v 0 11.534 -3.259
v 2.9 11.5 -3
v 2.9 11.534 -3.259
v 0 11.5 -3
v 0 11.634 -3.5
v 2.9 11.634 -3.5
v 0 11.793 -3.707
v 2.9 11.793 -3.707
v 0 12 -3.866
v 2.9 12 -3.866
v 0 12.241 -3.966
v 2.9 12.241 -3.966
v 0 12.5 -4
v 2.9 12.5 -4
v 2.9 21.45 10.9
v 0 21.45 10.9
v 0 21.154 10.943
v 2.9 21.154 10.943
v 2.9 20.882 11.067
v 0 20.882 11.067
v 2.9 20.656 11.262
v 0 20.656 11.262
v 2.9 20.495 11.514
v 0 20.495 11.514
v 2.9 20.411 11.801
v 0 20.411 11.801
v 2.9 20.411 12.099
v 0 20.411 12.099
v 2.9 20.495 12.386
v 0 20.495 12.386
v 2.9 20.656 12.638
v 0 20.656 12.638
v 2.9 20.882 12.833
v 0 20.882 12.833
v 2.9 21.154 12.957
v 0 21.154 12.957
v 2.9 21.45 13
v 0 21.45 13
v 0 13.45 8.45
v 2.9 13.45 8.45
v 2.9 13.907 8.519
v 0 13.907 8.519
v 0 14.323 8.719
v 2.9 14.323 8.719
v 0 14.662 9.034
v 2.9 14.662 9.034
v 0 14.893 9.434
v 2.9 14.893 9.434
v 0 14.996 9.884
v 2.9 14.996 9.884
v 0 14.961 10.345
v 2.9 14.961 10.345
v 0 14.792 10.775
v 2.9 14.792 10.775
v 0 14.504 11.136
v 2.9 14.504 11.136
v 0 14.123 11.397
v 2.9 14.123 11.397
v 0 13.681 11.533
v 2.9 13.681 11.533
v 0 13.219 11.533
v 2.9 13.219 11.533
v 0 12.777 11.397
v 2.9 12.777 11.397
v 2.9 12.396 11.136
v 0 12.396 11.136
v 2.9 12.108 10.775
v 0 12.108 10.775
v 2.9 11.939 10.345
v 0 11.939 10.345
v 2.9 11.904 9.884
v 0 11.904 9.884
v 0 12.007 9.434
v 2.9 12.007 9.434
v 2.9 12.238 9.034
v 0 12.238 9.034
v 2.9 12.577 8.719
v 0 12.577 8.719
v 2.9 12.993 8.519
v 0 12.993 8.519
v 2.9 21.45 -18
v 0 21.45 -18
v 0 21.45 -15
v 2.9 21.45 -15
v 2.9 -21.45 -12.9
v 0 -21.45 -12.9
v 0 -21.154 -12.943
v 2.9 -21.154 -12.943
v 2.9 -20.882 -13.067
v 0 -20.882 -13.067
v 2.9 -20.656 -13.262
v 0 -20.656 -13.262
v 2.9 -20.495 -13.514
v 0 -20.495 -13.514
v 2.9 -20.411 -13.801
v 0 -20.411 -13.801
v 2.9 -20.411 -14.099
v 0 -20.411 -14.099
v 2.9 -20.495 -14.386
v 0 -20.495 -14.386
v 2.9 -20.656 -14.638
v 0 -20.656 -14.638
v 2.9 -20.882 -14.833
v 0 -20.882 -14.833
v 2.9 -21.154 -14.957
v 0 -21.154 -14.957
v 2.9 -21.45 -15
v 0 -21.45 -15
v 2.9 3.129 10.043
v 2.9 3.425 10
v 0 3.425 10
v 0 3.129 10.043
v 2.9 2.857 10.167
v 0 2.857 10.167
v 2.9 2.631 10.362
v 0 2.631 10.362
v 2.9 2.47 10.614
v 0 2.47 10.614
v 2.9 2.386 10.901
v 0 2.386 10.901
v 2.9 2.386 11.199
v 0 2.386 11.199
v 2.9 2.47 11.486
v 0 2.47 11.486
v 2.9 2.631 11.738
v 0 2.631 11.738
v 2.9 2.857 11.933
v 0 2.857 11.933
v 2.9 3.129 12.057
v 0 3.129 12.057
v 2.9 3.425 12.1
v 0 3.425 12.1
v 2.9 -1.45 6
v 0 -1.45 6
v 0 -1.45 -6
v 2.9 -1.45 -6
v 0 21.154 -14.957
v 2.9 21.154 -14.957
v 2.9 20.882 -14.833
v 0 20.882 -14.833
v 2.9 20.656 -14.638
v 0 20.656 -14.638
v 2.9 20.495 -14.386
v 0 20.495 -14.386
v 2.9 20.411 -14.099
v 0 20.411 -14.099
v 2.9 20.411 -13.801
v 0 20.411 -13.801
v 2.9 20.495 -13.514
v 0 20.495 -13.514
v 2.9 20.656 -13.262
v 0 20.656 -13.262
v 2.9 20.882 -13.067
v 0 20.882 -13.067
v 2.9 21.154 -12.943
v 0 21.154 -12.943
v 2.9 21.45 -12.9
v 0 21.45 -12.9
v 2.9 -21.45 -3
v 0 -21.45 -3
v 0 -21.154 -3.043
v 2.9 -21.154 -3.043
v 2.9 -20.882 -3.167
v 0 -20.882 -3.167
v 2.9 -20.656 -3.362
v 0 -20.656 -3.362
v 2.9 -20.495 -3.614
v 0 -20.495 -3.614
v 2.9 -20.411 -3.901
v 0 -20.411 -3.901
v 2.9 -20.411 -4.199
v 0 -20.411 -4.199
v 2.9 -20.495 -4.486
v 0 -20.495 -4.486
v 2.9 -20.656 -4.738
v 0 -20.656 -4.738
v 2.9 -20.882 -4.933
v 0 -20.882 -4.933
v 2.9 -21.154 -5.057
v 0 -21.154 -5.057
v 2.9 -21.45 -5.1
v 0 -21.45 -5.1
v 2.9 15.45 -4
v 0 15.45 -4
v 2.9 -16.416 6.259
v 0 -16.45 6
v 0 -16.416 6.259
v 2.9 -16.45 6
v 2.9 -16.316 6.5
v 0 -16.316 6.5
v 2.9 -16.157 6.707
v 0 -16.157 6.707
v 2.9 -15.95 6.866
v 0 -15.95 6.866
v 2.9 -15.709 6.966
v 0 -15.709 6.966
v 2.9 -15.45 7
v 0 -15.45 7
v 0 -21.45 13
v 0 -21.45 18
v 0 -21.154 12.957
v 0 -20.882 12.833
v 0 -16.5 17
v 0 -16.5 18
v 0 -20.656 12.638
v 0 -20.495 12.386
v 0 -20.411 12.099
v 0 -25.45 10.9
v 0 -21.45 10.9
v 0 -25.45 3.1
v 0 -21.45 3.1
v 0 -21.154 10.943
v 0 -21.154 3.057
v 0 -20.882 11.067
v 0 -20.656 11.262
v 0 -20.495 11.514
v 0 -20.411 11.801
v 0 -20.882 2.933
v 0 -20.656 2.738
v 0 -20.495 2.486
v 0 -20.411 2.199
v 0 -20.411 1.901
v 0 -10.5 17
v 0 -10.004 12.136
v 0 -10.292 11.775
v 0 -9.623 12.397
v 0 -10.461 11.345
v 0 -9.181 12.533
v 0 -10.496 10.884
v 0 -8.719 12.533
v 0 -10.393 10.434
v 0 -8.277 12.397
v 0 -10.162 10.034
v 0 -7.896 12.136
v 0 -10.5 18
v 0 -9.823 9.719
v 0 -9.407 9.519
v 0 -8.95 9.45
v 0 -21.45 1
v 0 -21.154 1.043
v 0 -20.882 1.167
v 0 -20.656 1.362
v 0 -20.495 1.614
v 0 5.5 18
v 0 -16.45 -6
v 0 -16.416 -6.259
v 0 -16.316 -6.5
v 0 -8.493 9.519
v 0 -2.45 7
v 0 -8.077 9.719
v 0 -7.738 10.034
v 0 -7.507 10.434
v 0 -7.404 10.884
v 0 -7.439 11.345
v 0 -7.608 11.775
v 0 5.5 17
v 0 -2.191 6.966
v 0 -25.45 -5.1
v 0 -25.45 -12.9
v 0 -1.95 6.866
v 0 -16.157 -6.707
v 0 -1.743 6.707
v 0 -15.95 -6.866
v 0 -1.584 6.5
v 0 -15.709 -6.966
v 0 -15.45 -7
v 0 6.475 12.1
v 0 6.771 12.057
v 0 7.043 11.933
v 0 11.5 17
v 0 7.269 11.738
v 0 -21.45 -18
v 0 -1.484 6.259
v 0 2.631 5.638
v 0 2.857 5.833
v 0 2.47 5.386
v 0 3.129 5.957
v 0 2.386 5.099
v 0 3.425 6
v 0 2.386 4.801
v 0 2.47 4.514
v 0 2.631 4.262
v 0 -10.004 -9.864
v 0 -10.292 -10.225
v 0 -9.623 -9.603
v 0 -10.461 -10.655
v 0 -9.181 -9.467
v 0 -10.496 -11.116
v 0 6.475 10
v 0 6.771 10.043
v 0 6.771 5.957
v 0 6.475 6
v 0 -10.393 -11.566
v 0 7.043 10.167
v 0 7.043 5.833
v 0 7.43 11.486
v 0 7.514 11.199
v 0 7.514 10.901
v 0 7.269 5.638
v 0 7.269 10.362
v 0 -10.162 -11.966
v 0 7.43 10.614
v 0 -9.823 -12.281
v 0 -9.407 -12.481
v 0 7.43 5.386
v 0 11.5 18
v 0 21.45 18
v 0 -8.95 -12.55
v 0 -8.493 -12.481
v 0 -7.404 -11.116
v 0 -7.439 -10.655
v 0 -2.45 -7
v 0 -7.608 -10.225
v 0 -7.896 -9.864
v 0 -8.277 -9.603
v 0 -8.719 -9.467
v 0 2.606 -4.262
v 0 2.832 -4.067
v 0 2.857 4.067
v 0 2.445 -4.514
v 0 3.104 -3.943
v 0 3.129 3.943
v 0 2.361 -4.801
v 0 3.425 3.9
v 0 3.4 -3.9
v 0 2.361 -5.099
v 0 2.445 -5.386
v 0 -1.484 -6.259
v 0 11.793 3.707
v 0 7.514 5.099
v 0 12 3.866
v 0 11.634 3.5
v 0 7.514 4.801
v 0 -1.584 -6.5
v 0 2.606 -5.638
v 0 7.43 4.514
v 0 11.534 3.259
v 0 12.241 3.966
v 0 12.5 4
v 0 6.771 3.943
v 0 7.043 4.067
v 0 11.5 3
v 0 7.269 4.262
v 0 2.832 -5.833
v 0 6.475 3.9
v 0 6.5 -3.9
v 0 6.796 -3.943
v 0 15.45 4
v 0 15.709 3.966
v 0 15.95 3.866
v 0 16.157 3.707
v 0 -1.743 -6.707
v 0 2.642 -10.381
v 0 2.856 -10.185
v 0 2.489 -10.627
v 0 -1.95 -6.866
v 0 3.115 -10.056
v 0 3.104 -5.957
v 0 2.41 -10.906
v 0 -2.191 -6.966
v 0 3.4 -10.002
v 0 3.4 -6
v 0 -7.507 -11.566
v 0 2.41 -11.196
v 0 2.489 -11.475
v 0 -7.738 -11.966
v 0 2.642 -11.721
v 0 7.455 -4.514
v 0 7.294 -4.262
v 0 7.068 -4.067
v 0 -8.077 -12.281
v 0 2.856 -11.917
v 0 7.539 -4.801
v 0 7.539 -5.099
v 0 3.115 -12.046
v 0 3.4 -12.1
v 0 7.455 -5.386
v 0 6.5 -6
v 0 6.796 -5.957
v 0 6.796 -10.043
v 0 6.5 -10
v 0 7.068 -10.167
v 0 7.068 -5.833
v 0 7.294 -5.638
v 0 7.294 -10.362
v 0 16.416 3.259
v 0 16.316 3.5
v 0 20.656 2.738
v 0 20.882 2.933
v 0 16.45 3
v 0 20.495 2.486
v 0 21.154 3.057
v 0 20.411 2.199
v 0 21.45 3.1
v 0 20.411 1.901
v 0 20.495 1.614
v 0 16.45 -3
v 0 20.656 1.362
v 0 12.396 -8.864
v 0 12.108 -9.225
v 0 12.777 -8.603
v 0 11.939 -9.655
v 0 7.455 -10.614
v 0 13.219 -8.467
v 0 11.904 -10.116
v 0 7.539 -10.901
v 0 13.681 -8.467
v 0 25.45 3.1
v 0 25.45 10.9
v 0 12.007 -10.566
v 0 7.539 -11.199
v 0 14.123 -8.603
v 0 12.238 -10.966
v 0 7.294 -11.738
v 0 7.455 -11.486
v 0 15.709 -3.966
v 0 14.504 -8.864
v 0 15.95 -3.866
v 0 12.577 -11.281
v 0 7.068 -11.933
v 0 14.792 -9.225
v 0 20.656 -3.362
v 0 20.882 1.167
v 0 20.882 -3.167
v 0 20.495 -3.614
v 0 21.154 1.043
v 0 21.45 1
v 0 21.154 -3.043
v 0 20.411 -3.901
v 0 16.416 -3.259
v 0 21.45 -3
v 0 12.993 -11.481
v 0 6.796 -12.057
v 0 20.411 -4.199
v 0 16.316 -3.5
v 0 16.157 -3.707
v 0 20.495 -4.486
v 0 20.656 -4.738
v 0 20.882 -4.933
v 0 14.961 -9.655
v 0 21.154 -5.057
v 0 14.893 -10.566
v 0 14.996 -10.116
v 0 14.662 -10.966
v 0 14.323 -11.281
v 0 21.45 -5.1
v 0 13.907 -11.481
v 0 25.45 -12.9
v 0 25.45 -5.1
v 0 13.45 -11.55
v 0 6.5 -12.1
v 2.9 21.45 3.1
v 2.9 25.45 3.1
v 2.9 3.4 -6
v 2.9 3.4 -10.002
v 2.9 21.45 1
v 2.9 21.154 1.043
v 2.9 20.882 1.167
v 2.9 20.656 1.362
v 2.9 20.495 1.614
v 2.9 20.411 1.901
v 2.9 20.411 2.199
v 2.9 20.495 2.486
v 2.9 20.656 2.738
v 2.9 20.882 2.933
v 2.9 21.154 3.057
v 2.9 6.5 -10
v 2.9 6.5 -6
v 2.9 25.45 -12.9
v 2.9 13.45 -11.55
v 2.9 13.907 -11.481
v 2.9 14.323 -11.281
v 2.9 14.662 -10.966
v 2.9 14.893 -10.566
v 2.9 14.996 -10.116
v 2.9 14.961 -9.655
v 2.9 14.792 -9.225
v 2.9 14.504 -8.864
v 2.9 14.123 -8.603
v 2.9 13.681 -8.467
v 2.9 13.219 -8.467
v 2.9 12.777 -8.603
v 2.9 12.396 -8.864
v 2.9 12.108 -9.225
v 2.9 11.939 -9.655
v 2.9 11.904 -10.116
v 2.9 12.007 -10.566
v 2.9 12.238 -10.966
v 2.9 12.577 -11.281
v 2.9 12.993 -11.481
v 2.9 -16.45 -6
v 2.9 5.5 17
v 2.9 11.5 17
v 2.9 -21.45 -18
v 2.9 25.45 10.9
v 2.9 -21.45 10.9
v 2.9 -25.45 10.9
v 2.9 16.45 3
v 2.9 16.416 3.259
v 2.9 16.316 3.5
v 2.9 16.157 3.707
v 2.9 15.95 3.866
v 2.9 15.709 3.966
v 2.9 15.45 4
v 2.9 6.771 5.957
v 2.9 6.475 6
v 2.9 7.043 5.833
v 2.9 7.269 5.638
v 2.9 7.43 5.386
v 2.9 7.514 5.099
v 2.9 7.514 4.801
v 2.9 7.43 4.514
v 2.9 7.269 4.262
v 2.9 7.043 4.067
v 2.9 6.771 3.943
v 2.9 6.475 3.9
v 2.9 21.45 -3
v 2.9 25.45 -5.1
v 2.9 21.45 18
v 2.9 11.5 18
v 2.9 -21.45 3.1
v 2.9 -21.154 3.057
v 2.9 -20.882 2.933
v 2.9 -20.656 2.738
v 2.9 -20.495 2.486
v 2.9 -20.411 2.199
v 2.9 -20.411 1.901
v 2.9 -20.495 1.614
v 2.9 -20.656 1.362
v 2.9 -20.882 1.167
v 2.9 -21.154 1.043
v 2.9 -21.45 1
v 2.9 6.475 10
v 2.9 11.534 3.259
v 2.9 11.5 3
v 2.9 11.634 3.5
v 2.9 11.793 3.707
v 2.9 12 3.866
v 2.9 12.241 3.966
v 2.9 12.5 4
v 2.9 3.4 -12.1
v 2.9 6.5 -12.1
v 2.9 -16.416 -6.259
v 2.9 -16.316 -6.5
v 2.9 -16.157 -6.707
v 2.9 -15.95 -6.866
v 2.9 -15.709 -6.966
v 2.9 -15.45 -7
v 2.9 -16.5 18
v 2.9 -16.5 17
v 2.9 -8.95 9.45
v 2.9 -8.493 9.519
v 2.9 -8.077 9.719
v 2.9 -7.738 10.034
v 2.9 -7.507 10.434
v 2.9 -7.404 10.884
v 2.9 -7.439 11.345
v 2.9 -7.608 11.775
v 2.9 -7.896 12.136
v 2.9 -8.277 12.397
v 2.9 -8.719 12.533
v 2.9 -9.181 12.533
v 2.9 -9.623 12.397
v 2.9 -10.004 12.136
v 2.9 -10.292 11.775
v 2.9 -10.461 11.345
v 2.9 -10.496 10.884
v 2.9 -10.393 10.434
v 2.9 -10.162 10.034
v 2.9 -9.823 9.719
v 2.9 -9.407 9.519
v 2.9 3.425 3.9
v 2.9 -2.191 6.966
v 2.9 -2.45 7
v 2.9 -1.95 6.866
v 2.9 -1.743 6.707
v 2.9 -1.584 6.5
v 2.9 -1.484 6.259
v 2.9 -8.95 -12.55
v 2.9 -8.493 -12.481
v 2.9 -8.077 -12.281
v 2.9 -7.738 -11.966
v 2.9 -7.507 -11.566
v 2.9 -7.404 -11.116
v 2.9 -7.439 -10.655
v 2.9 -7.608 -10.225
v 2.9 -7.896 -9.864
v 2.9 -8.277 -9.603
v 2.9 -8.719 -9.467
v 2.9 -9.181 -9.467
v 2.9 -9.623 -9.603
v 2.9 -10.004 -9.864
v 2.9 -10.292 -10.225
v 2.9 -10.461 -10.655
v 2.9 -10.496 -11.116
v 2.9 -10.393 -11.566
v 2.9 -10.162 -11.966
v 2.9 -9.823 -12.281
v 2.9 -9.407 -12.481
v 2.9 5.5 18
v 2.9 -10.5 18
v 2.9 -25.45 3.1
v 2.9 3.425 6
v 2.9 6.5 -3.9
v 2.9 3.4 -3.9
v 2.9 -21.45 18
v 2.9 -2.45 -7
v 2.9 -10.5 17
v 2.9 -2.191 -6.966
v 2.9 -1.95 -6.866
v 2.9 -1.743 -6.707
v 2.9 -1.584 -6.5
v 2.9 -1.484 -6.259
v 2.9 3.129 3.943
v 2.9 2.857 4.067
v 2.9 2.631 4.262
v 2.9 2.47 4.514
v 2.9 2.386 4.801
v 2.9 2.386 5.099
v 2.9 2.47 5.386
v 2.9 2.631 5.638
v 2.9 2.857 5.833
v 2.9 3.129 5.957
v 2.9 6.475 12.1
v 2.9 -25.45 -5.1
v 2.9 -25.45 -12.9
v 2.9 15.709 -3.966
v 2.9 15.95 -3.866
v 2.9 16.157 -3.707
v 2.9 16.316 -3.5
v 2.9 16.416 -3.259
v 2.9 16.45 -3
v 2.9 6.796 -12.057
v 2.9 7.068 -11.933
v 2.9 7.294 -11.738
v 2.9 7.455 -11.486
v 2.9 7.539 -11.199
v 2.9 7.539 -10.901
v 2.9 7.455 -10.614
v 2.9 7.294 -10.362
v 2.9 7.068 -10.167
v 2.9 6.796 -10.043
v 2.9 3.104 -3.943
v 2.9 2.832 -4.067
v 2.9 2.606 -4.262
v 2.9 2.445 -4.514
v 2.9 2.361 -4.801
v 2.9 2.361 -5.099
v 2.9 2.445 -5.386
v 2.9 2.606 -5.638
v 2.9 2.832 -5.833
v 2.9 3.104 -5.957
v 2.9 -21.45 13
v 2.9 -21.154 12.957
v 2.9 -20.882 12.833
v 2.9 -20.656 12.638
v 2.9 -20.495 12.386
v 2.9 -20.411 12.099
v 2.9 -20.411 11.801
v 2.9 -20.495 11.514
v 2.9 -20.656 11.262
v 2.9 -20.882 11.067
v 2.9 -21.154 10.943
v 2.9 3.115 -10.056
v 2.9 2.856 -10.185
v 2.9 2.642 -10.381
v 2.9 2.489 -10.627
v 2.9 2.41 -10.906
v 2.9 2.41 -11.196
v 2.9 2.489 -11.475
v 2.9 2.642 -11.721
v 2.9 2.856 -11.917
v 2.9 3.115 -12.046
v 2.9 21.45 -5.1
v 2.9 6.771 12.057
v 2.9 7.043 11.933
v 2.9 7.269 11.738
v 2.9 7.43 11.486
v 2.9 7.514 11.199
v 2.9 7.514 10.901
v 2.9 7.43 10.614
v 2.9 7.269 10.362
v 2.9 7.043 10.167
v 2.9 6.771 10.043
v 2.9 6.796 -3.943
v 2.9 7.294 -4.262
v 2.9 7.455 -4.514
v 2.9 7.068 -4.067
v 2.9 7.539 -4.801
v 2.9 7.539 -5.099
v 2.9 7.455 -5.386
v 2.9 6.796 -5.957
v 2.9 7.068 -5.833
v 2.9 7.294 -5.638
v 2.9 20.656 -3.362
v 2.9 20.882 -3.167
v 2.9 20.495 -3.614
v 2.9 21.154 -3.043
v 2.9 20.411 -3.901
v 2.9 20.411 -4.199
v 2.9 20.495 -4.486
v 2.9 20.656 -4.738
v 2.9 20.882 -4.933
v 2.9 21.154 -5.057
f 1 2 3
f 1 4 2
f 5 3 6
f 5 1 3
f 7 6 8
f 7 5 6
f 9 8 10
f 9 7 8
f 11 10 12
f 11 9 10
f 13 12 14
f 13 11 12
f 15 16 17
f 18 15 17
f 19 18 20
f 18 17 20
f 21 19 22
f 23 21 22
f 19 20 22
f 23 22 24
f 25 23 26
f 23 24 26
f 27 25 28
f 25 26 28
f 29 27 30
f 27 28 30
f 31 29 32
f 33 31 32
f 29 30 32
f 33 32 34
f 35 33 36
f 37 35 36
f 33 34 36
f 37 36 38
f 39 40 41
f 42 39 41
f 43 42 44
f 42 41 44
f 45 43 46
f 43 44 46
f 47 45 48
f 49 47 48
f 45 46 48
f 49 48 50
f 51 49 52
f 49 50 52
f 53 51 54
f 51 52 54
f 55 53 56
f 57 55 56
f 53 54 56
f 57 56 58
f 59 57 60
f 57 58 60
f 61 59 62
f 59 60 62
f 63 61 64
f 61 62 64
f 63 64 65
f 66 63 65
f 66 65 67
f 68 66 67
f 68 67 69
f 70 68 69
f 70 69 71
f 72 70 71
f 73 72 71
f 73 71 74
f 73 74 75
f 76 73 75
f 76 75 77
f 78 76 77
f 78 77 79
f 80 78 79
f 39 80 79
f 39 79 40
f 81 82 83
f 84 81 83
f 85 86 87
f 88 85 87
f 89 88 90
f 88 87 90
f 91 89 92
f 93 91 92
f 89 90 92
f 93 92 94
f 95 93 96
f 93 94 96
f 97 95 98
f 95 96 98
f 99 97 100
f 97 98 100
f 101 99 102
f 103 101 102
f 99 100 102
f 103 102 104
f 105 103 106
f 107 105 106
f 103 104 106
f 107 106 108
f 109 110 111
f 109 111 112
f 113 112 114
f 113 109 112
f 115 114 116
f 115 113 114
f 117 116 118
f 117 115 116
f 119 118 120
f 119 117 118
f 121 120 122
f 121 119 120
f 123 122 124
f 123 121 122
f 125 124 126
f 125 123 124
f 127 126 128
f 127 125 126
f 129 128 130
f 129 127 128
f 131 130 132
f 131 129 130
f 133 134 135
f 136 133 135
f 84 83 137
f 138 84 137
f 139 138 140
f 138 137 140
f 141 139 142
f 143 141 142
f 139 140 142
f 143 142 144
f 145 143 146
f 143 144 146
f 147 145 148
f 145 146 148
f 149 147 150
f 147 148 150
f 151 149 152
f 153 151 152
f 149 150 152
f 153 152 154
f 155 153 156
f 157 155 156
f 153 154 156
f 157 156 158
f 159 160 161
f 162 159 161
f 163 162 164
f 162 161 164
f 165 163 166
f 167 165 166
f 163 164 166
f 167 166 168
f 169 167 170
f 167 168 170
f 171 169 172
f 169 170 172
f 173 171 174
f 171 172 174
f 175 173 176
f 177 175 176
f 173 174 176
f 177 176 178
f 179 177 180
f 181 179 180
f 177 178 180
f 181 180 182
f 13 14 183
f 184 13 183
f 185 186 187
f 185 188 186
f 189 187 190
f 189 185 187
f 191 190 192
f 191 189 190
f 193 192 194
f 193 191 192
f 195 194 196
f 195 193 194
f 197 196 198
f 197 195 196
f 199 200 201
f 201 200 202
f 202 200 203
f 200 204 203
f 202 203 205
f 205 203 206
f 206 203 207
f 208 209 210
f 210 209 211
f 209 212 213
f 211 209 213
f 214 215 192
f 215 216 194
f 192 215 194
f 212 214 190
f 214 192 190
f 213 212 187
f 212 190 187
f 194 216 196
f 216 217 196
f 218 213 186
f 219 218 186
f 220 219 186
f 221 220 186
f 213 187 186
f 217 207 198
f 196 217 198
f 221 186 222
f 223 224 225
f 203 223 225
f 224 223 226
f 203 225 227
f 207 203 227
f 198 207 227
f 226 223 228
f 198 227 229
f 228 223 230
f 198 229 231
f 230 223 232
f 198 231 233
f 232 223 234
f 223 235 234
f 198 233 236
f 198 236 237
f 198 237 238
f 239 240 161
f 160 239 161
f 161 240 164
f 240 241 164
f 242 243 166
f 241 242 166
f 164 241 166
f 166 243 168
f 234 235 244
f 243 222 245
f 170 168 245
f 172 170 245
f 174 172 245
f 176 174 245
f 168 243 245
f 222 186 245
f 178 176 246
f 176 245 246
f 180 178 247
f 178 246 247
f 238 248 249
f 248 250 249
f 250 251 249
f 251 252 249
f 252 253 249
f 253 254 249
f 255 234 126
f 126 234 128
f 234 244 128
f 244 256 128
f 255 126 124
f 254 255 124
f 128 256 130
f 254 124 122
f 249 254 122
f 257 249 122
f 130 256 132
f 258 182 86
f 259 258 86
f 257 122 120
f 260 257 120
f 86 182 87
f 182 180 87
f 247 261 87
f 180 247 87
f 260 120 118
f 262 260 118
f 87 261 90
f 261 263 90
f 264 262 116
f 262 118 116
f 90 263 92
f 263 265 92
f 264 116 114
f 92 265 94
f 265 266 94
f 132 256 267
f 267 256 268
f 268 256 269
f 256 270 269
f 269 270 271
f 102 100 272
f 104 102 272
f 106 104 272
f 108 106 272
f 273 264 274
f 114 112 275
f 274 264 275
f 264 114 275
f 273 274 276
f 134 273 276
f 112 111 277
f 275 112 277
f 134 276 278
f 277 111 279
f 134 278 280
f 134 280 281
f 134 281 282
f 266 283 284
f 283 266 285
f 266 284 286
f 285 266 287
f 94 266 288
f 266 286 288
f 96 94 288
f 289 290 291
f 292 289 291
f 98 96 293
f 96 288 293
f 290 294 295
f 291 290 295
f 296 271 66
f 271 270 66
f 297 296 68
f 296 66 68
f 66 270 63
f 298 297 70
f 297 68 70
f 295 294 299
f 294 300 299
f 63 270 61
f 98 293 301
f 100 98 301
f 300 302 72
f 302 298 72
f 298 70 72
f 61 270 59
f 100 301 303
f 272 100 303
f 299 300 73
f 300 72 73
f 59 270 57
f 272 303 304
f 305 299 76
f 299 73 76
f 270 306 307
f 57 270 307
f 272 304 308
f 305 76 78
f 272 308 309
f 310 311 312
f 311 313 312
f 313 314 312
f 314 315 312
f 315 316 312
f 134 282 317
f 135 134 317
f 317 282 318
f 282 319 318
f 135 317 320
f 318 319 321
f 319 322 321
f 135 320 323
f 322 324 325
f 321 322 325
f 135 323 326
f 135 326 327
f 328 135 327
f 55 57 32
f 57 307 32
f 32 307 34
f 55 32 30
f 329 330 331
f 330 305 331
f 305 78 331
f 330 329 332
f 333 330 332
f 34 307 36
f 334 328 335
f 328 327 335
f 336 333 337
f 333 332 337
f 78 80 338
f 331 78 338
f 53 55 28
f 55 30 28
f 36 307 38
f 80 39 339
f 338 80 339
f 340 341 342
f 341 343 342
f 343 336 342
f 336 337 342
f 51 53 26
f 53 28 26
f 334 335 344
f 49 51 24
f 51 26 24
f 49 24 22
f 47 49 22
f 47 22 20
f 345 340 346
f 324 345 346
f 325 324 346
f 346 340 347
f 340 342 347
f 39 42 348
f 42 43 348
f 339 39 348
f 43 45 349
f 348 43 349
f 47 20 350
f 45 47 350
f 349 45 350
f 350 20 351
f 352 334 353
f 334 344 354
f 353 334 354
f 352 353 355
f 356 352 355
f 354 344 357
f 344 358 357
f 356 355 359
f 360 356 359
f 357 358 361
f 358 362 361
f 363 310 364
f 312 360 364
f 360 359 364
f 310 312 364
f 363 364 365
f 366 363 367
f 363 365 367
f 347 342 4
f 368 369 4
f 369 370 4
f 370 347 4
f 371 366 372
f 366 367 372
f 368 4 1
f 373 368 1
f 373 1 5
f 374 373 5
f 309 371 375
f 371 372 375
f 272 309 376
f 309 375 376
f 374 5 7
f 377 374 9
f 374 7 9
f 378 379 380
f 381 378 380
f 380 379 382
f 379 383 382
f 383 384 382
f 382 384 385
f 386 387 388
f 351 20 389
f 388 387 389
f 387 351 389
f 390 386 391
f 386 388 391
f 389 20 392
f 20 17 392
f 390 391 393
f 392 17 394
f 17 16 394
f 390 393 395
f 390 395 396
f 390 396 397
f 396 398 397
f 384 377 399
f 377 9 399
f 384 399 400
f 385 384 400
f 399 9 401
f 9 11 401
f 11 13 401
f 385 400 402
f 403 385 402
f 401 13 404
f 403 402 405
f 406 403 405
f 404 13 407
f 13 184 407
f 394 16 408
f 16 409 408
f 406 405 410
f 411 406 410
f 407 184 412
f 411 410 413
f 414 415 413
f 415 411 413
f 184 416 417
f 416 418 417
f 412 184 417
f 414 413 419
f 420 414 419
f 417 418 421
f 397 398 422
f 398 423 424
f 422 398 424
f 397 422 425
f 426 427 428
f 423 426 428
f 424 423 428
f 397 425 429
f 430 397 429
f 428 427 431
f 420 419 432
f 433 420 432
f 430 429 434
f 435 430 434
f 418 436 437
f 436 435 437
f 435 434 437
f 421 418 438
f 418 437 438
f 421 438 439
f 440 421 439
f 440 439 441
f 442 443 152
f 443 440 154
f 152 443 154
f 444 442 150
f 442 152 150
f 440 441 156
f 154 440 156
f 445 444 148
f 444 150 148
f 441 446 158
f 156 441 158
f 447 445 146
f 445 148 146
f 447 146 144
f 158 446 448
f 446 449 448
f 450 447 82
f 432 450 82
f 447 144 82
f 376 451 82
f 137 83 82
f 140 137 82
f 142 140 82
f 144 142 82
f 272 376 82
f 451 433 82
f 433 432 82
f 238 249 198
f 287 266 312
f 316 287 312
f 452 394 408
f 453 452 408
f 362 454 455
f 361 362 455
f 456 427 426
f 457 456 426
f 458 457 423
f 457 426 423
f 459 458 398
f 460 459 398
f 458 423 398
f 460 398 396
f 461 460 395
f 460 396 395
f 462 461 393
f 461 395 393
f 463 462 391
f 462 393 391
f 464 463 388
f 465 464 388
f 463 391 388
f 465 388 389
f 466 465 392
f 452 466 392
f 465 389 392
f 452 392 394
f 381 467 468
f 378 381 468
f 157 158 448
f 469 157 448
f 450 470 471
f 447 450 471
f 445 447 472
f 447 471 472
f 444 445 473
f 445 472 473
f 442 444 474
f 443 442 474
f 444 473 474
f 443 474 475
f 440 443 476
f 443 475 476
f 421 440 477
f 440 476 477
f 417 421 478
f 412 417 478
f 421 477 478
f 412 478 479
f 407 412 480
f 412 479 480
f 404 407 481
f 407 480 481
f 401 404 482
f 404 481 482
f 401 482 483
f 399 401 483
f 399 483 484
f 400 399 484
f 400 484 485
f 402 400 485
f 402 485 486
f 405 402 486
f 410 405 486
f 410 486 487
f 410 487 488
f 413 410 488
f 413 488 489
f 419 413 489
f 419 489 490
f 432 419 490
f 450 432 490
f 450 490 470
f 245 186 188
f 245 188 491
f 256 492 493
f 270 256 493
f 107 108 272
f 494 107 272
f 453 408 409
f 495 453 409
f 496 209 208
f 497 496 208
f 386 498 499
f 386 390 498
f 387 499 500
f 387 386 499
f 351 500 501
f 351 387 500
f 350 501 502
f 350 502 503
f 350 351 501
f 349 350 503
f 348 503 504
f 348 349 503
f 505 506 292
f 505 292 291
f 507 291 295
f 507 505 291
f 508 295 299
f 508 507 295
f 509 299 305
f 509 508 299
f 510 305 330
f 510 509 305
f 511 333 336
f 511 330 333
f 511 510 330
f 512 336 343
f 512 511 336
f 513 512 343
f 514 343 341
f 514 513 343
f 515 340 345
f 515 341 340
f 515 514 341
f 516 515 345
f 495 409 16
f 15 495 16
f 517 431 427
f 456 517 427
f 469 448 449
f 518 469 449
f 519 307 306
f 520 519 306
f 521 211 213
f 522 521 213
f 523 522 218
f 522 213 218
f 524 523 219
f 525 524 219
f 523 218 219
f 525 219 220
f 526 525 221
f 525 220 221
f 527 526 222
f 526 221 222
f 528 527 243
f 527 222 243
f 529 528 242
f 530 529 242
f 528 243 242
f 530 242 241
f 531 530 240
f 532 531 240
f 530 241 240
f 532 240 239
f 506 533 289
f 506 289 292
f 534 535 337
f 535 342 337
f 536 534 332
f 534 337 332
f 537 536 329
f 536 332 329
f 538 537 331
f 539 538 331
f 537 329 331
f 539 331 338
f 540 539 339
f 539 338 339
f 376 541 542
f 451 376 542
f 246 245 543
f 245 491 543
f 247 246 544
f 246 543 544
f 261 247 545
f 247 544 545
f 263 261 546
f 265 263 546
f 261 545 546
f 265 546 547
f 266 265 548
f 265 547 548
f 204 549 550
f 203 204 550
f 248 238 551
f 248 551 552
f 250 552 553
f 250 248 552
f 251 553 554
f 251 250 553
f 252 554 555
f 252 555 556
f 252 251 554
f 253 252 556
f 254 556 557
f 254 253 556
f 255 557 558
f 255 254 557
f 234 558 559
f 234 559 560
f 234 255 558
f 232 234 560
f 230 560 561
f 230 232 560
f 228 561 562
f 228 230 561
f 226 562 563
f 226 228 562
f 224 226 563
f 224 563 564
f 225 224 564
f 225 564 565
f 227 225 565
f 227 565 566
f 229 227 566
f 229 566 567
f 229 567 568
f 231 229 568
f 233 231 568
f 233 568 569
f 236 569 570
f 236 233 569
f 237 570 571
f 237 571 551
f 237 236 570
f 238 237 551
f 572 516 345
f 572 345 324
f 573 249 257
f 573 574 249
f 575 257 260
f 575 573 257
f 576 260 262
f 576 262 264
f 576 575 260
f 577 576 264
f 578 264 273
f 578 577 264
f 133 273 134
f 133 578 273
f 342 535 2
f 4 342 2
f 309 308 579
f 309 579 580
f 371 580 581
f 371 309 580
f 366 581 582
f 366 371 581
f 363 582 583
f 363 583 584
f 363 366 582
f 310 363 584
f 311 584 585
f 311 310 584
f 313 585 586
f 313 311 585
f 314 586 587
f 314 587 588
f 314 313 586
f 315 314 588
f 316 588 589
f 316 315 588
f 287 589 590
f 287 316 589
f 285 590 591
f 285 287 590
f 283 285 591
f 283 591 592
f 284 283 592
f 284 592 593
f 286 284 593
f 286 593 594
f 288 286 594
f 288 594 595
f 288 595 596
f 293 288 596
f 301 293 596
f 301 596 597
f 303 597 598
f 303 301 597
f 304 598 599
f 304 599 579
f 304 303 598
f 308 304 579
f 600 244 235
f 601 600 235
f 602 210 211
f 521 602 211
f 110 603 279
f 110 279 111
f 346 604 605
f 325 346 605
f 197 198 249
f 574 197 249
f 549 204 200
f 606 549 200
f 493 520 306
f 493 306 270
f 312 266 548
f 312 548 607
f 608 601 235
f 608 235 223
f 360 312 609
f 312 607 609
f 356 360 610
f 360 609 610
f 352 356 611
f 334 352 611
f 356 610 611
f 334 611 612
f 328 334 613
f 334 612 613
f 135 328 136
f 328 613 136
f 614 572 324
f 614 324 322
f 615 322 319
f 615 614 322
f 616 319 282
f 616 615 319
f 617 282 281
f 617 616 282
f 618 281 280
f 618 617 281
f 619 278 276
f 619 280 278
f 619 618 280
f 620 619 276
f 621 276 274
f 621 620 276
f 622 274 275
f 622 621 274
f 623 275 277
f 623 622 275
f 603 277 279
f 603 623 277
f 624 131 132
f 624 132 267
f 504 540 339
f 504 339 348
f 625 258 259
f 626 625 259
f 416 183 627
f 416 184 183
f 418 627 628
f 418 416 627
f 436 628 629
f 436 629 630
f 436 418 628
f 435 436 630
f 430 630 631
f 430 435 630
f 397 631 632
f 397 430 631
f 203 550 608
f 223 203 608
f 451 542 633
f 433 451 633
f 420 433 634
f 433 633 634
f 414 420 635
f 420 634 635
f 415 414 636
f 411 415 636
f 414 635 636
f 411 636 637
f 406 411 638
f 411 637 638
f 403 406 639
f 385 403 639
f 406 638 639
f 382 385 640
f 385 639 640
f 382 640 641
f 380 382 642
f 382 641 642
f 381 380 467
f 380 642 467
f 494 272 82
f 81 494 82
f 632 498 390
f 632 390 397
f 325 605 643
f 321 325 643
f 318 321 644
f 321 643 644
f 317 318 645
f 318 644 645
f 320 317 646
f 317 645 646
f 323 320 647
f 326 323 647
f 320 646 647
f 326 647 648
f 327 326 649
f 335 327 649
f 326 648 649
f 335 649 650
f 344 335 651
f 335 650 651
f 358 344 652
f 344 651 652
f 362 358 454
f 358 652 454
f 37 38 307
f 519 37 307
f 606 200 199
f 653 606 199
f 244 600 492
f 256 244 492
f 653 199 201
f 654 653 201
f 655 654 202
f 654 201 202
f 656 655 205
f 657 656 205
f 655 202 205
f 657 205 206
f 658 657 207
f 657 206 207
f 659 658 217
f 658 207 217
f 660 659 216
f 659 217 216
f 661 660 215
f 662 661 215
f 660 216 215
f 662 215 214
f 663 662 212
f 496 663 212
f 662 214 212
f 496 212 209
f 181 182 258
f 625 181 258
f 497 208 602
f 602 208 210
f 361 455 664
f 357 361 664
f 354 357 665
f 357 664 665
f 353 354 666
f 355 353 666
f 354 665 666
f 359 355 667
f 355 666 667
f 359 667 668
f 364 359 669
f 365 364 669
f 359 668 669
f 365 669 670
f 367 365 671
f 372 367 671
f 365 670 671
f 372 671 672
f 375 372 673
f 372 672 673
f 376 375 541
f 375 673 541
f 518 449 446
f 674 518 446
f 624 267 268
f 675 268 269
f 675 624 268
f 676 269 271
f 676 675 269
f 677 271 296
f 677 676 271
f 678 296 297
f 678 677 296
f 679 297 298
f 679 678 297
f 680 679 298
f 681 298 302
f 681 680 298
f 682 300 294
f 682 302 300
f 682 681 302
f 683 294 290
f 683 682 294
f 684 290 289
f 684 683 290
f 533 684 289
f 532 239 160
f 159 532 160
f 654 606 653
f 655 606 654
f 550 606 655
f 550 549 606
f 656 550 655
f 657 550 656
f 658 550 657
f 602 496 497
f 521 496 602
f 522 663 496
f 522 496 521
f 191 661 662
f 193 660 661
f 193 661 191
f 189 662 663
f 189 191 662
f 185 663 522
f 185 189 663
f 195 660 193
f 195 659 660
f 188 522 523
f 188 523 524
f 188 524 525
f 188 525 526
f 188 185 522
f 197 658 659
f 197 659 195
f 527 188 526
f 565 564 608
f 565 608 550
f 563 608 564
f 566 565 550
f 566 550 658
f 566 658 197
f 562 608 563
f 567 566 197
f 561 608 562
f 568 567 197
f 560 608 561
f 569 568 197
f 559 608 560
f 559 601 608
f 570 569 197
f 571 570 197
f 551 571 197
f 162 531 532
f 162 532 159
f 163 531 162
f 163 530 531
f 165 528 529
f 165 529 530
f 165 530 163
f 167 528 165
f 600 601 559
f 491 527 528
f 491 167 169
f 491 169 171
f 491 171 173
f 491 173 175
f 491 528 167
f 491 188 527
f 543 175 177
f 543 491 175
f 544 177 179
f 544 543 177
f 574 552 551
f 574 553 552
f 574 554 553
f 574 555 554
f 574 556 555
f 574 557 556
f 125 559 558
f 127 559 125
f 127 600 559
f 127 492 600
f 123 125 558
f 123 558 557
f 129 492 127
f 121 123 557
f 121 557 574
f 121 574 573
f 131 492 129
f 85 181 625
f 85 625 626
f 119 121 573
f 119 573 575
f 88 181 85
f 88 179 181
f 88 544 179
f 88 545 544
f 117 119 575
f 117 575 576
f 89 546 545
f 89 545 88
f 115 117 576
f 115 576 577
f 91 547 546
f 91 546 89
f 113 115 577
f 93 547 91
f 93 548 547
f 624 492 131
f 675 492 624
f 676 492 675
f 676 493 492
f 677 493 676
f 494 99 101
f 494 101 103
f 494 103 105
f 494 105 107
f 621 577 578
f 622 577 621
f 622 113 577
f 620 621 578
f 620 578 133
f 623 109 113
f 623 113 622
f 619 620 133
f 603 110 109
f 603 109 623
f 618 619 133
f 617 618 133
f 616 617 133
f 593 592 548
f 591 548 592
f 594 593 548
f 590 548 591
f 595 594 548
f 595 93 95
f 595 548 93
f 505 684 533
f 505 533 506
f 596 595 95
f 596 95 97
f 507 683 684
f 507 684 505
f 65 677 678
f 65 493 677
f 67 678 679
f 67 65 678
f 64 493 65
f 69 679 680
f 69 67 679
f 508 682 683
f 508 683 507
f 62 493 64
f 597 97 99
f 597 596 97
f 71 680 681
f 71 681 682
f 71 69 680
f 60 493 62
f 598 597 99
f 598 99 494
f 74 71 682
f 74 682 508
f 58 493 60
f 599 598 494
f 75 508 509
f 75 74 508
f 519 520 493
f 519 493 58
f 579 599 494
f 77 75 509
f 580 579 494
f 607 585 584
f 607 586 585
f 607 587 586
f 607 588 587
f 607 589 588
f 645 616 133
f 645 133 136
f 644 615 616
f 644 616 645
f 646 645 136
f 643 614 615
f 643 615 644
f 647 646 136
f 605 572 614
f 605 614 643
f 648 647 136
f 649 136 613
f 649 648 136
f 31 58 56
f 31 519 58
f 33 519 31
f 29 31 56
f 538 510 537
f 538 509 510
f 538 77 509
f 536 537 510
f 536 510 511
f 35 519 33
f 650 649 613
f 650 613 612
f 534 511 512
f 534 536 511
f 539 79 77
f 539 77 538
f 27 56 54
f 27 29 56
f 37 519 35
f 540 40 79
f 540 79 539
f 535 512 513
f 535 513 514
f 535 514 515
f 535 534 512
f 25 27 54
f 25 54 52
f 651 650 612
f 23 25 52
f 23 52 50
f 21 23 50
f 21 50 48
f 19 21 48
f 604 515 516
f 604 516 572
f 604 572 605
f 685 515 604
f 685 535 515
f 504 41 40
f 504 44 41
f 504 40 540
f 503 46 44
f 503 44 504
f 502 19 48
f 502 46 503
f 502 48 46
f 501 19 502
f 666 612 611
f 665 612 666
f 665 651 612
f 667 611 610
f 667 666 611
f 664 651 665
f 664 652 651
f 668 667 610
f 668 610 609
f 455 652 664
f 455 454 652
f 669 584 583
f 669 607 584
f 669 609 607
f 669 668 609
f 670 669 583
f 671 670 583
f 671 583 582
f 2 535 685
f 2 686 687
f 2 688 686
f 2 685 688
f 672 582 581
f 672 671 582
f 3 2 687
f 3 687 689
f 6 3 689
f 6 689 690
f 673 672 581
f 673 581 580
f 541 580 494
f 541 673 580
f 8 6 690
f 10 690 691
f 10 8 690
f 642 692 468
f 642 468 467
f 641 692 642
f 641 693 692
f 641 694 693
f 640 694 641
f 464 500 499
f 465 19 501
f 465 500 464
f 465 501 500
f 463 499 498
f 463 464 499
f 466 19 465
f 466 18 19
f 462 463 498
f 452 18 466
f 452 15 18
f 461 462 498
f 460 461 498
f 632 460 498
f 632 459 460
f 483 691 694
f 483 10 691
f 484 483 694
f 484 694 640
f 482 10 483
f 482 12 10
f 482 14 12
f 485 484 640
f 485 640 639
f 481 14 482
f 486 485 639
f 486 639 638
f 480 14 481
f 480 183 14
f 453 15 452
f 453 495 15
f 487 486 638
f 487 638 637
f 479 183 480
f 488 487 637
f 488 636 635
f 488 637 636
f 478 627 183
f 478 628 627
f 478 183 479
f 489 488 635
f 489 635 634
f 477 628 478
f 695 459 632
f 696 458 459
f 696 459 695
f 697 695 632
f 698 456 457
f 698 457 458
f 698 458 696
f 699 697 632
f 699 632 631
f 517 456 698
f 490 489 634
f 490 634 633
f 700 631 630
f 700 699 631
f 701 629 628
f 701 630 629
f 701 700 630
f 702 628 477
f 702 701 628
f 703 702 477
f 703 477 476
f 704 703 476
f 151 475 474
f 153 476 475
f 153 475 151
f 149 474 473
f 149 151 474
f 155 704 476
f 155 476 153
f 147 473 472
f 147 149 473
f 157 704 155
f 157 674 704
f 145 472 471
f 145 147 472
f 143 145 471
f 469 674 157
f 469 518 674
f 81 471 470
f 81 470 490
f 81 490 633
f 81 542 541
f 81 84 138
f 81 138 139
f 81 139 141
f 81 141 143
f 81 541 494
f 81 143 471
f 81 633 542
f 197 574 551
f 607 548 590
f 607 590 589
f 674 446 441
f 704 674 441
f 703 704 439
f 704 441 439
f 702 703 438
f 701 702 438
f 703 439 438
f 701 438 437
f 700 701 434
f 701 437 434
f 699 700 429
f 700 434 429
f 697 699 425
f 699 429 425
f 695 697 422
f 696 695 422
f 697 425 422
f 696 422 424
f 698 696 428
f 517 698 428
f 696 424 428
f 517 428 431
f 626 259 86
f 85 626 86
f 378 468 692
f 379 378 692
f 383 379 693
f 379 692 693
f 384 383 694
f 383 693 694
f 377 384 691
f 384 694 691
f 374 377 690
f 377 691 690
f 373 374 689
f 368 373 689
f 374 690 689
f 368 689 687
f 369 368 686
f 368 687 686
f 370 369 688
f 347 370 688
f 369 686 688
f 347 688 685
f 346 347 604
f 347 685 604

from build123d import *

# Parameters (mm, degrees)
SKETCH_1_R          = 1.55
SKETCH_1_W          = 14
SKETCH_1_H          = 15
EXTRUDE_1_DEPTH     = 2.9
SKETCH_2_R          = 1.55
SKETCH_2_W          = 8
SKETCH_2_H          = 4.95
SKETCH_2_H_2        = 6
CUT_EXTRUDE_1_DEPTH = 10
FILLET_1_R          = 1


with BuildPart() as part:
    # 草图1 → 凸台-拉伸1 (new body)
    with BuildSketch(Plane(origin=(0, 0, 0), x_dir=(0, 0, -1), z_dir=(1, 0, 0))):
        with BuildLine():
            Line((-10.9, 25.45), (-10.9, 21.45))
            ThreePointArc((-10.9, 21.45), (-11.95, 20.4), (-13, 21.45))
            Line((-13, 21.45), (-18, 21.45))
            Line((-18, 21.45), (-18, 16.95))
            Line((-18, 16.95), (-18, 11.95))
            Line((-18, 11.95), (-18, -11.95))
            Line((-18, -11.95), (-18, -16.95))
            Line((-18, -16.95), (-18, -21.45))
            Line((-18, -21.45), (-13, -21.45))
            ThreePointArc((-13, -21.45), (-11.95, -20.4), (-10.9, -21.45))
            Line((-10.9, -21.45), (-10.9, -25.45))
            Line((-10.9, -25.45), (-3.1, -25.45))
            Line((-3.1, -25.45), (-3.1, -21.45))
            ThreePointArc((-3.1, -21.45), (-2.05, -20.4), (-1, -21.45))
            Line((-1, -21.45), (3, -21.45))
            ThreePointArc((3, -21.45), (4.05, -20.4), (5.1, -21.45))
            Line((5.1, -21.45), (5.1, -25.45))
            Line((5.1, -25.45), (12.9, -25.45))
            Line((12.9, -25.45), (12.9, -21.45))
            ThreePointArc((12.9, -21.45), (13.95, -20.4), (15, -21.45))
            Line((15, -21.45), (18, -21.45))
            Line((18, -21.45), (18, 21.45))
            Line((18, 21.45), (15, 21.45))
            ThreePointArc((15, 21.45), (13.95, 20.4), (12.9, 21.45))
            Line((12.9, 21.45), (12.9, 25.45))
            Line((12.9, 25.45), (5.1, 25.45))
            Line((5.1, 25.45), (5.1, 21.45))
            ThreePointArc((5.1, 21.45), (4.05, 20.4), (3, 21.45))
            Line((3, 21.45), (-1, 21.45))
            ThreePointArc((-1, 21.45), (-2.05, 20.4), (-3.1, 21.45))
            Line((-3.1, 21.45), (-3.1, 25.45))
            Line((-3.1, 25.45), (-10.9, 25.45))
        make_face()
        with Locations((-11, -8.95)):
            Circle(SKETCH_1_R, mode=Mode.SUBTRACT)
        with Locations((0, -8.95)):
            Rectangle(SKETCH_1_W, SKETCH_1_H, mode=Mode.SUBTRACT)
        with Locations((11, -8.95)):
            Circle(SKETCH_1_R, mode=Mode.SUBTRACT)
    extrude(amount=EXTRUDE_1_DEPTH)

    # 草图2 → 切除-拉伸1 (cut)
    with BuildSketch(Plane(origin=(2.9, 0, 0), x_dir=(0, 0, -1), z_dir=(1, 0, 0))):
        with Locations((10, 13.45)):
            Circle(SKETCH_2_R)
        with Locations((-10, 13.45)):
            Circle(SKETCH_2_R)
        with BuildLine():
            Line((-12.1, 3.425), (-12.1, 6.475))
            ThreePointArc((-12.1, 6.475), (-11.05, 7.525), (-10, 6.475))
            Line((-10, 6.475), (-6, 6.475))
            ThreePointArc((-6, 6.475), (-4.95, 7.525), (-3.9, 6.475))
            Line((-3.9, 6.475), (-3.9, 3.425))
            ThreePointArc((-3.9, 3.425), (-4.95, 2.375), (-6, 3.425))
            Line((-6, 3.425), (-10, 3.425))
            ThreePointArc((-10, 3.425), (-11.05, 2.375), (-12.1, 3.425))
        make_face()
        with BuildLine():
            Line((12.1, 3.4), (12.1, 6.5))
            ThreePointArc((12.1, 6.5), (11.05, 7.55), (10, 6.5))
            Line((10, 6.5), (6, 6.5))
            ThreePointArc((6, 6.5), (4.95, 7.55), (3.9, 6.5))
            Line((3.9, 6.5), (3.9, 3.4))
            ThreePointArc((3.9, 3.4), (4.95, 2.35), (6, 3.4))
            Line((6, 3.4), (10.002382304, 3.4))
            ThreePointArc((10.002382304, 3.4), (11.051191152, 2.4), (12.1, 3.4))
        make_face()
        with Locations((0, 13.975)):
            Rectangle(SKETCH_2_W, SKETCH_2_H)
        with Locations((-21, 8.5)):
            Rectangle(SKETCH_2_W, SKETCH_2_H_2)
        with Locations((-21, -13.5)):
            Rectangle(SKETCH_2_W, SKETCH_2_H_2)
    extrude(amount=-CUT_EXTRUDE_1_DEPTH, mode=Mode.SUBTRACT)

    # 圆角1
    fillet_1_edges = [part.edges().sort_by_distance(p)[0] for p in [
        (1.45, 16.45, -4),
        (1.45, 11.5, -4),
        (1.45, 11.5, 4),
        (1.45, 16.45, 4),
        (1.45, -16.45, 7),
        (1.45, -16.45, -7),
        (1.45, -1.45, -7),
        (1.45, -1.45, 7),
    ]]
    fillet(fillet_1_edges, radius=FILLET_1_R)


solid = part.part
